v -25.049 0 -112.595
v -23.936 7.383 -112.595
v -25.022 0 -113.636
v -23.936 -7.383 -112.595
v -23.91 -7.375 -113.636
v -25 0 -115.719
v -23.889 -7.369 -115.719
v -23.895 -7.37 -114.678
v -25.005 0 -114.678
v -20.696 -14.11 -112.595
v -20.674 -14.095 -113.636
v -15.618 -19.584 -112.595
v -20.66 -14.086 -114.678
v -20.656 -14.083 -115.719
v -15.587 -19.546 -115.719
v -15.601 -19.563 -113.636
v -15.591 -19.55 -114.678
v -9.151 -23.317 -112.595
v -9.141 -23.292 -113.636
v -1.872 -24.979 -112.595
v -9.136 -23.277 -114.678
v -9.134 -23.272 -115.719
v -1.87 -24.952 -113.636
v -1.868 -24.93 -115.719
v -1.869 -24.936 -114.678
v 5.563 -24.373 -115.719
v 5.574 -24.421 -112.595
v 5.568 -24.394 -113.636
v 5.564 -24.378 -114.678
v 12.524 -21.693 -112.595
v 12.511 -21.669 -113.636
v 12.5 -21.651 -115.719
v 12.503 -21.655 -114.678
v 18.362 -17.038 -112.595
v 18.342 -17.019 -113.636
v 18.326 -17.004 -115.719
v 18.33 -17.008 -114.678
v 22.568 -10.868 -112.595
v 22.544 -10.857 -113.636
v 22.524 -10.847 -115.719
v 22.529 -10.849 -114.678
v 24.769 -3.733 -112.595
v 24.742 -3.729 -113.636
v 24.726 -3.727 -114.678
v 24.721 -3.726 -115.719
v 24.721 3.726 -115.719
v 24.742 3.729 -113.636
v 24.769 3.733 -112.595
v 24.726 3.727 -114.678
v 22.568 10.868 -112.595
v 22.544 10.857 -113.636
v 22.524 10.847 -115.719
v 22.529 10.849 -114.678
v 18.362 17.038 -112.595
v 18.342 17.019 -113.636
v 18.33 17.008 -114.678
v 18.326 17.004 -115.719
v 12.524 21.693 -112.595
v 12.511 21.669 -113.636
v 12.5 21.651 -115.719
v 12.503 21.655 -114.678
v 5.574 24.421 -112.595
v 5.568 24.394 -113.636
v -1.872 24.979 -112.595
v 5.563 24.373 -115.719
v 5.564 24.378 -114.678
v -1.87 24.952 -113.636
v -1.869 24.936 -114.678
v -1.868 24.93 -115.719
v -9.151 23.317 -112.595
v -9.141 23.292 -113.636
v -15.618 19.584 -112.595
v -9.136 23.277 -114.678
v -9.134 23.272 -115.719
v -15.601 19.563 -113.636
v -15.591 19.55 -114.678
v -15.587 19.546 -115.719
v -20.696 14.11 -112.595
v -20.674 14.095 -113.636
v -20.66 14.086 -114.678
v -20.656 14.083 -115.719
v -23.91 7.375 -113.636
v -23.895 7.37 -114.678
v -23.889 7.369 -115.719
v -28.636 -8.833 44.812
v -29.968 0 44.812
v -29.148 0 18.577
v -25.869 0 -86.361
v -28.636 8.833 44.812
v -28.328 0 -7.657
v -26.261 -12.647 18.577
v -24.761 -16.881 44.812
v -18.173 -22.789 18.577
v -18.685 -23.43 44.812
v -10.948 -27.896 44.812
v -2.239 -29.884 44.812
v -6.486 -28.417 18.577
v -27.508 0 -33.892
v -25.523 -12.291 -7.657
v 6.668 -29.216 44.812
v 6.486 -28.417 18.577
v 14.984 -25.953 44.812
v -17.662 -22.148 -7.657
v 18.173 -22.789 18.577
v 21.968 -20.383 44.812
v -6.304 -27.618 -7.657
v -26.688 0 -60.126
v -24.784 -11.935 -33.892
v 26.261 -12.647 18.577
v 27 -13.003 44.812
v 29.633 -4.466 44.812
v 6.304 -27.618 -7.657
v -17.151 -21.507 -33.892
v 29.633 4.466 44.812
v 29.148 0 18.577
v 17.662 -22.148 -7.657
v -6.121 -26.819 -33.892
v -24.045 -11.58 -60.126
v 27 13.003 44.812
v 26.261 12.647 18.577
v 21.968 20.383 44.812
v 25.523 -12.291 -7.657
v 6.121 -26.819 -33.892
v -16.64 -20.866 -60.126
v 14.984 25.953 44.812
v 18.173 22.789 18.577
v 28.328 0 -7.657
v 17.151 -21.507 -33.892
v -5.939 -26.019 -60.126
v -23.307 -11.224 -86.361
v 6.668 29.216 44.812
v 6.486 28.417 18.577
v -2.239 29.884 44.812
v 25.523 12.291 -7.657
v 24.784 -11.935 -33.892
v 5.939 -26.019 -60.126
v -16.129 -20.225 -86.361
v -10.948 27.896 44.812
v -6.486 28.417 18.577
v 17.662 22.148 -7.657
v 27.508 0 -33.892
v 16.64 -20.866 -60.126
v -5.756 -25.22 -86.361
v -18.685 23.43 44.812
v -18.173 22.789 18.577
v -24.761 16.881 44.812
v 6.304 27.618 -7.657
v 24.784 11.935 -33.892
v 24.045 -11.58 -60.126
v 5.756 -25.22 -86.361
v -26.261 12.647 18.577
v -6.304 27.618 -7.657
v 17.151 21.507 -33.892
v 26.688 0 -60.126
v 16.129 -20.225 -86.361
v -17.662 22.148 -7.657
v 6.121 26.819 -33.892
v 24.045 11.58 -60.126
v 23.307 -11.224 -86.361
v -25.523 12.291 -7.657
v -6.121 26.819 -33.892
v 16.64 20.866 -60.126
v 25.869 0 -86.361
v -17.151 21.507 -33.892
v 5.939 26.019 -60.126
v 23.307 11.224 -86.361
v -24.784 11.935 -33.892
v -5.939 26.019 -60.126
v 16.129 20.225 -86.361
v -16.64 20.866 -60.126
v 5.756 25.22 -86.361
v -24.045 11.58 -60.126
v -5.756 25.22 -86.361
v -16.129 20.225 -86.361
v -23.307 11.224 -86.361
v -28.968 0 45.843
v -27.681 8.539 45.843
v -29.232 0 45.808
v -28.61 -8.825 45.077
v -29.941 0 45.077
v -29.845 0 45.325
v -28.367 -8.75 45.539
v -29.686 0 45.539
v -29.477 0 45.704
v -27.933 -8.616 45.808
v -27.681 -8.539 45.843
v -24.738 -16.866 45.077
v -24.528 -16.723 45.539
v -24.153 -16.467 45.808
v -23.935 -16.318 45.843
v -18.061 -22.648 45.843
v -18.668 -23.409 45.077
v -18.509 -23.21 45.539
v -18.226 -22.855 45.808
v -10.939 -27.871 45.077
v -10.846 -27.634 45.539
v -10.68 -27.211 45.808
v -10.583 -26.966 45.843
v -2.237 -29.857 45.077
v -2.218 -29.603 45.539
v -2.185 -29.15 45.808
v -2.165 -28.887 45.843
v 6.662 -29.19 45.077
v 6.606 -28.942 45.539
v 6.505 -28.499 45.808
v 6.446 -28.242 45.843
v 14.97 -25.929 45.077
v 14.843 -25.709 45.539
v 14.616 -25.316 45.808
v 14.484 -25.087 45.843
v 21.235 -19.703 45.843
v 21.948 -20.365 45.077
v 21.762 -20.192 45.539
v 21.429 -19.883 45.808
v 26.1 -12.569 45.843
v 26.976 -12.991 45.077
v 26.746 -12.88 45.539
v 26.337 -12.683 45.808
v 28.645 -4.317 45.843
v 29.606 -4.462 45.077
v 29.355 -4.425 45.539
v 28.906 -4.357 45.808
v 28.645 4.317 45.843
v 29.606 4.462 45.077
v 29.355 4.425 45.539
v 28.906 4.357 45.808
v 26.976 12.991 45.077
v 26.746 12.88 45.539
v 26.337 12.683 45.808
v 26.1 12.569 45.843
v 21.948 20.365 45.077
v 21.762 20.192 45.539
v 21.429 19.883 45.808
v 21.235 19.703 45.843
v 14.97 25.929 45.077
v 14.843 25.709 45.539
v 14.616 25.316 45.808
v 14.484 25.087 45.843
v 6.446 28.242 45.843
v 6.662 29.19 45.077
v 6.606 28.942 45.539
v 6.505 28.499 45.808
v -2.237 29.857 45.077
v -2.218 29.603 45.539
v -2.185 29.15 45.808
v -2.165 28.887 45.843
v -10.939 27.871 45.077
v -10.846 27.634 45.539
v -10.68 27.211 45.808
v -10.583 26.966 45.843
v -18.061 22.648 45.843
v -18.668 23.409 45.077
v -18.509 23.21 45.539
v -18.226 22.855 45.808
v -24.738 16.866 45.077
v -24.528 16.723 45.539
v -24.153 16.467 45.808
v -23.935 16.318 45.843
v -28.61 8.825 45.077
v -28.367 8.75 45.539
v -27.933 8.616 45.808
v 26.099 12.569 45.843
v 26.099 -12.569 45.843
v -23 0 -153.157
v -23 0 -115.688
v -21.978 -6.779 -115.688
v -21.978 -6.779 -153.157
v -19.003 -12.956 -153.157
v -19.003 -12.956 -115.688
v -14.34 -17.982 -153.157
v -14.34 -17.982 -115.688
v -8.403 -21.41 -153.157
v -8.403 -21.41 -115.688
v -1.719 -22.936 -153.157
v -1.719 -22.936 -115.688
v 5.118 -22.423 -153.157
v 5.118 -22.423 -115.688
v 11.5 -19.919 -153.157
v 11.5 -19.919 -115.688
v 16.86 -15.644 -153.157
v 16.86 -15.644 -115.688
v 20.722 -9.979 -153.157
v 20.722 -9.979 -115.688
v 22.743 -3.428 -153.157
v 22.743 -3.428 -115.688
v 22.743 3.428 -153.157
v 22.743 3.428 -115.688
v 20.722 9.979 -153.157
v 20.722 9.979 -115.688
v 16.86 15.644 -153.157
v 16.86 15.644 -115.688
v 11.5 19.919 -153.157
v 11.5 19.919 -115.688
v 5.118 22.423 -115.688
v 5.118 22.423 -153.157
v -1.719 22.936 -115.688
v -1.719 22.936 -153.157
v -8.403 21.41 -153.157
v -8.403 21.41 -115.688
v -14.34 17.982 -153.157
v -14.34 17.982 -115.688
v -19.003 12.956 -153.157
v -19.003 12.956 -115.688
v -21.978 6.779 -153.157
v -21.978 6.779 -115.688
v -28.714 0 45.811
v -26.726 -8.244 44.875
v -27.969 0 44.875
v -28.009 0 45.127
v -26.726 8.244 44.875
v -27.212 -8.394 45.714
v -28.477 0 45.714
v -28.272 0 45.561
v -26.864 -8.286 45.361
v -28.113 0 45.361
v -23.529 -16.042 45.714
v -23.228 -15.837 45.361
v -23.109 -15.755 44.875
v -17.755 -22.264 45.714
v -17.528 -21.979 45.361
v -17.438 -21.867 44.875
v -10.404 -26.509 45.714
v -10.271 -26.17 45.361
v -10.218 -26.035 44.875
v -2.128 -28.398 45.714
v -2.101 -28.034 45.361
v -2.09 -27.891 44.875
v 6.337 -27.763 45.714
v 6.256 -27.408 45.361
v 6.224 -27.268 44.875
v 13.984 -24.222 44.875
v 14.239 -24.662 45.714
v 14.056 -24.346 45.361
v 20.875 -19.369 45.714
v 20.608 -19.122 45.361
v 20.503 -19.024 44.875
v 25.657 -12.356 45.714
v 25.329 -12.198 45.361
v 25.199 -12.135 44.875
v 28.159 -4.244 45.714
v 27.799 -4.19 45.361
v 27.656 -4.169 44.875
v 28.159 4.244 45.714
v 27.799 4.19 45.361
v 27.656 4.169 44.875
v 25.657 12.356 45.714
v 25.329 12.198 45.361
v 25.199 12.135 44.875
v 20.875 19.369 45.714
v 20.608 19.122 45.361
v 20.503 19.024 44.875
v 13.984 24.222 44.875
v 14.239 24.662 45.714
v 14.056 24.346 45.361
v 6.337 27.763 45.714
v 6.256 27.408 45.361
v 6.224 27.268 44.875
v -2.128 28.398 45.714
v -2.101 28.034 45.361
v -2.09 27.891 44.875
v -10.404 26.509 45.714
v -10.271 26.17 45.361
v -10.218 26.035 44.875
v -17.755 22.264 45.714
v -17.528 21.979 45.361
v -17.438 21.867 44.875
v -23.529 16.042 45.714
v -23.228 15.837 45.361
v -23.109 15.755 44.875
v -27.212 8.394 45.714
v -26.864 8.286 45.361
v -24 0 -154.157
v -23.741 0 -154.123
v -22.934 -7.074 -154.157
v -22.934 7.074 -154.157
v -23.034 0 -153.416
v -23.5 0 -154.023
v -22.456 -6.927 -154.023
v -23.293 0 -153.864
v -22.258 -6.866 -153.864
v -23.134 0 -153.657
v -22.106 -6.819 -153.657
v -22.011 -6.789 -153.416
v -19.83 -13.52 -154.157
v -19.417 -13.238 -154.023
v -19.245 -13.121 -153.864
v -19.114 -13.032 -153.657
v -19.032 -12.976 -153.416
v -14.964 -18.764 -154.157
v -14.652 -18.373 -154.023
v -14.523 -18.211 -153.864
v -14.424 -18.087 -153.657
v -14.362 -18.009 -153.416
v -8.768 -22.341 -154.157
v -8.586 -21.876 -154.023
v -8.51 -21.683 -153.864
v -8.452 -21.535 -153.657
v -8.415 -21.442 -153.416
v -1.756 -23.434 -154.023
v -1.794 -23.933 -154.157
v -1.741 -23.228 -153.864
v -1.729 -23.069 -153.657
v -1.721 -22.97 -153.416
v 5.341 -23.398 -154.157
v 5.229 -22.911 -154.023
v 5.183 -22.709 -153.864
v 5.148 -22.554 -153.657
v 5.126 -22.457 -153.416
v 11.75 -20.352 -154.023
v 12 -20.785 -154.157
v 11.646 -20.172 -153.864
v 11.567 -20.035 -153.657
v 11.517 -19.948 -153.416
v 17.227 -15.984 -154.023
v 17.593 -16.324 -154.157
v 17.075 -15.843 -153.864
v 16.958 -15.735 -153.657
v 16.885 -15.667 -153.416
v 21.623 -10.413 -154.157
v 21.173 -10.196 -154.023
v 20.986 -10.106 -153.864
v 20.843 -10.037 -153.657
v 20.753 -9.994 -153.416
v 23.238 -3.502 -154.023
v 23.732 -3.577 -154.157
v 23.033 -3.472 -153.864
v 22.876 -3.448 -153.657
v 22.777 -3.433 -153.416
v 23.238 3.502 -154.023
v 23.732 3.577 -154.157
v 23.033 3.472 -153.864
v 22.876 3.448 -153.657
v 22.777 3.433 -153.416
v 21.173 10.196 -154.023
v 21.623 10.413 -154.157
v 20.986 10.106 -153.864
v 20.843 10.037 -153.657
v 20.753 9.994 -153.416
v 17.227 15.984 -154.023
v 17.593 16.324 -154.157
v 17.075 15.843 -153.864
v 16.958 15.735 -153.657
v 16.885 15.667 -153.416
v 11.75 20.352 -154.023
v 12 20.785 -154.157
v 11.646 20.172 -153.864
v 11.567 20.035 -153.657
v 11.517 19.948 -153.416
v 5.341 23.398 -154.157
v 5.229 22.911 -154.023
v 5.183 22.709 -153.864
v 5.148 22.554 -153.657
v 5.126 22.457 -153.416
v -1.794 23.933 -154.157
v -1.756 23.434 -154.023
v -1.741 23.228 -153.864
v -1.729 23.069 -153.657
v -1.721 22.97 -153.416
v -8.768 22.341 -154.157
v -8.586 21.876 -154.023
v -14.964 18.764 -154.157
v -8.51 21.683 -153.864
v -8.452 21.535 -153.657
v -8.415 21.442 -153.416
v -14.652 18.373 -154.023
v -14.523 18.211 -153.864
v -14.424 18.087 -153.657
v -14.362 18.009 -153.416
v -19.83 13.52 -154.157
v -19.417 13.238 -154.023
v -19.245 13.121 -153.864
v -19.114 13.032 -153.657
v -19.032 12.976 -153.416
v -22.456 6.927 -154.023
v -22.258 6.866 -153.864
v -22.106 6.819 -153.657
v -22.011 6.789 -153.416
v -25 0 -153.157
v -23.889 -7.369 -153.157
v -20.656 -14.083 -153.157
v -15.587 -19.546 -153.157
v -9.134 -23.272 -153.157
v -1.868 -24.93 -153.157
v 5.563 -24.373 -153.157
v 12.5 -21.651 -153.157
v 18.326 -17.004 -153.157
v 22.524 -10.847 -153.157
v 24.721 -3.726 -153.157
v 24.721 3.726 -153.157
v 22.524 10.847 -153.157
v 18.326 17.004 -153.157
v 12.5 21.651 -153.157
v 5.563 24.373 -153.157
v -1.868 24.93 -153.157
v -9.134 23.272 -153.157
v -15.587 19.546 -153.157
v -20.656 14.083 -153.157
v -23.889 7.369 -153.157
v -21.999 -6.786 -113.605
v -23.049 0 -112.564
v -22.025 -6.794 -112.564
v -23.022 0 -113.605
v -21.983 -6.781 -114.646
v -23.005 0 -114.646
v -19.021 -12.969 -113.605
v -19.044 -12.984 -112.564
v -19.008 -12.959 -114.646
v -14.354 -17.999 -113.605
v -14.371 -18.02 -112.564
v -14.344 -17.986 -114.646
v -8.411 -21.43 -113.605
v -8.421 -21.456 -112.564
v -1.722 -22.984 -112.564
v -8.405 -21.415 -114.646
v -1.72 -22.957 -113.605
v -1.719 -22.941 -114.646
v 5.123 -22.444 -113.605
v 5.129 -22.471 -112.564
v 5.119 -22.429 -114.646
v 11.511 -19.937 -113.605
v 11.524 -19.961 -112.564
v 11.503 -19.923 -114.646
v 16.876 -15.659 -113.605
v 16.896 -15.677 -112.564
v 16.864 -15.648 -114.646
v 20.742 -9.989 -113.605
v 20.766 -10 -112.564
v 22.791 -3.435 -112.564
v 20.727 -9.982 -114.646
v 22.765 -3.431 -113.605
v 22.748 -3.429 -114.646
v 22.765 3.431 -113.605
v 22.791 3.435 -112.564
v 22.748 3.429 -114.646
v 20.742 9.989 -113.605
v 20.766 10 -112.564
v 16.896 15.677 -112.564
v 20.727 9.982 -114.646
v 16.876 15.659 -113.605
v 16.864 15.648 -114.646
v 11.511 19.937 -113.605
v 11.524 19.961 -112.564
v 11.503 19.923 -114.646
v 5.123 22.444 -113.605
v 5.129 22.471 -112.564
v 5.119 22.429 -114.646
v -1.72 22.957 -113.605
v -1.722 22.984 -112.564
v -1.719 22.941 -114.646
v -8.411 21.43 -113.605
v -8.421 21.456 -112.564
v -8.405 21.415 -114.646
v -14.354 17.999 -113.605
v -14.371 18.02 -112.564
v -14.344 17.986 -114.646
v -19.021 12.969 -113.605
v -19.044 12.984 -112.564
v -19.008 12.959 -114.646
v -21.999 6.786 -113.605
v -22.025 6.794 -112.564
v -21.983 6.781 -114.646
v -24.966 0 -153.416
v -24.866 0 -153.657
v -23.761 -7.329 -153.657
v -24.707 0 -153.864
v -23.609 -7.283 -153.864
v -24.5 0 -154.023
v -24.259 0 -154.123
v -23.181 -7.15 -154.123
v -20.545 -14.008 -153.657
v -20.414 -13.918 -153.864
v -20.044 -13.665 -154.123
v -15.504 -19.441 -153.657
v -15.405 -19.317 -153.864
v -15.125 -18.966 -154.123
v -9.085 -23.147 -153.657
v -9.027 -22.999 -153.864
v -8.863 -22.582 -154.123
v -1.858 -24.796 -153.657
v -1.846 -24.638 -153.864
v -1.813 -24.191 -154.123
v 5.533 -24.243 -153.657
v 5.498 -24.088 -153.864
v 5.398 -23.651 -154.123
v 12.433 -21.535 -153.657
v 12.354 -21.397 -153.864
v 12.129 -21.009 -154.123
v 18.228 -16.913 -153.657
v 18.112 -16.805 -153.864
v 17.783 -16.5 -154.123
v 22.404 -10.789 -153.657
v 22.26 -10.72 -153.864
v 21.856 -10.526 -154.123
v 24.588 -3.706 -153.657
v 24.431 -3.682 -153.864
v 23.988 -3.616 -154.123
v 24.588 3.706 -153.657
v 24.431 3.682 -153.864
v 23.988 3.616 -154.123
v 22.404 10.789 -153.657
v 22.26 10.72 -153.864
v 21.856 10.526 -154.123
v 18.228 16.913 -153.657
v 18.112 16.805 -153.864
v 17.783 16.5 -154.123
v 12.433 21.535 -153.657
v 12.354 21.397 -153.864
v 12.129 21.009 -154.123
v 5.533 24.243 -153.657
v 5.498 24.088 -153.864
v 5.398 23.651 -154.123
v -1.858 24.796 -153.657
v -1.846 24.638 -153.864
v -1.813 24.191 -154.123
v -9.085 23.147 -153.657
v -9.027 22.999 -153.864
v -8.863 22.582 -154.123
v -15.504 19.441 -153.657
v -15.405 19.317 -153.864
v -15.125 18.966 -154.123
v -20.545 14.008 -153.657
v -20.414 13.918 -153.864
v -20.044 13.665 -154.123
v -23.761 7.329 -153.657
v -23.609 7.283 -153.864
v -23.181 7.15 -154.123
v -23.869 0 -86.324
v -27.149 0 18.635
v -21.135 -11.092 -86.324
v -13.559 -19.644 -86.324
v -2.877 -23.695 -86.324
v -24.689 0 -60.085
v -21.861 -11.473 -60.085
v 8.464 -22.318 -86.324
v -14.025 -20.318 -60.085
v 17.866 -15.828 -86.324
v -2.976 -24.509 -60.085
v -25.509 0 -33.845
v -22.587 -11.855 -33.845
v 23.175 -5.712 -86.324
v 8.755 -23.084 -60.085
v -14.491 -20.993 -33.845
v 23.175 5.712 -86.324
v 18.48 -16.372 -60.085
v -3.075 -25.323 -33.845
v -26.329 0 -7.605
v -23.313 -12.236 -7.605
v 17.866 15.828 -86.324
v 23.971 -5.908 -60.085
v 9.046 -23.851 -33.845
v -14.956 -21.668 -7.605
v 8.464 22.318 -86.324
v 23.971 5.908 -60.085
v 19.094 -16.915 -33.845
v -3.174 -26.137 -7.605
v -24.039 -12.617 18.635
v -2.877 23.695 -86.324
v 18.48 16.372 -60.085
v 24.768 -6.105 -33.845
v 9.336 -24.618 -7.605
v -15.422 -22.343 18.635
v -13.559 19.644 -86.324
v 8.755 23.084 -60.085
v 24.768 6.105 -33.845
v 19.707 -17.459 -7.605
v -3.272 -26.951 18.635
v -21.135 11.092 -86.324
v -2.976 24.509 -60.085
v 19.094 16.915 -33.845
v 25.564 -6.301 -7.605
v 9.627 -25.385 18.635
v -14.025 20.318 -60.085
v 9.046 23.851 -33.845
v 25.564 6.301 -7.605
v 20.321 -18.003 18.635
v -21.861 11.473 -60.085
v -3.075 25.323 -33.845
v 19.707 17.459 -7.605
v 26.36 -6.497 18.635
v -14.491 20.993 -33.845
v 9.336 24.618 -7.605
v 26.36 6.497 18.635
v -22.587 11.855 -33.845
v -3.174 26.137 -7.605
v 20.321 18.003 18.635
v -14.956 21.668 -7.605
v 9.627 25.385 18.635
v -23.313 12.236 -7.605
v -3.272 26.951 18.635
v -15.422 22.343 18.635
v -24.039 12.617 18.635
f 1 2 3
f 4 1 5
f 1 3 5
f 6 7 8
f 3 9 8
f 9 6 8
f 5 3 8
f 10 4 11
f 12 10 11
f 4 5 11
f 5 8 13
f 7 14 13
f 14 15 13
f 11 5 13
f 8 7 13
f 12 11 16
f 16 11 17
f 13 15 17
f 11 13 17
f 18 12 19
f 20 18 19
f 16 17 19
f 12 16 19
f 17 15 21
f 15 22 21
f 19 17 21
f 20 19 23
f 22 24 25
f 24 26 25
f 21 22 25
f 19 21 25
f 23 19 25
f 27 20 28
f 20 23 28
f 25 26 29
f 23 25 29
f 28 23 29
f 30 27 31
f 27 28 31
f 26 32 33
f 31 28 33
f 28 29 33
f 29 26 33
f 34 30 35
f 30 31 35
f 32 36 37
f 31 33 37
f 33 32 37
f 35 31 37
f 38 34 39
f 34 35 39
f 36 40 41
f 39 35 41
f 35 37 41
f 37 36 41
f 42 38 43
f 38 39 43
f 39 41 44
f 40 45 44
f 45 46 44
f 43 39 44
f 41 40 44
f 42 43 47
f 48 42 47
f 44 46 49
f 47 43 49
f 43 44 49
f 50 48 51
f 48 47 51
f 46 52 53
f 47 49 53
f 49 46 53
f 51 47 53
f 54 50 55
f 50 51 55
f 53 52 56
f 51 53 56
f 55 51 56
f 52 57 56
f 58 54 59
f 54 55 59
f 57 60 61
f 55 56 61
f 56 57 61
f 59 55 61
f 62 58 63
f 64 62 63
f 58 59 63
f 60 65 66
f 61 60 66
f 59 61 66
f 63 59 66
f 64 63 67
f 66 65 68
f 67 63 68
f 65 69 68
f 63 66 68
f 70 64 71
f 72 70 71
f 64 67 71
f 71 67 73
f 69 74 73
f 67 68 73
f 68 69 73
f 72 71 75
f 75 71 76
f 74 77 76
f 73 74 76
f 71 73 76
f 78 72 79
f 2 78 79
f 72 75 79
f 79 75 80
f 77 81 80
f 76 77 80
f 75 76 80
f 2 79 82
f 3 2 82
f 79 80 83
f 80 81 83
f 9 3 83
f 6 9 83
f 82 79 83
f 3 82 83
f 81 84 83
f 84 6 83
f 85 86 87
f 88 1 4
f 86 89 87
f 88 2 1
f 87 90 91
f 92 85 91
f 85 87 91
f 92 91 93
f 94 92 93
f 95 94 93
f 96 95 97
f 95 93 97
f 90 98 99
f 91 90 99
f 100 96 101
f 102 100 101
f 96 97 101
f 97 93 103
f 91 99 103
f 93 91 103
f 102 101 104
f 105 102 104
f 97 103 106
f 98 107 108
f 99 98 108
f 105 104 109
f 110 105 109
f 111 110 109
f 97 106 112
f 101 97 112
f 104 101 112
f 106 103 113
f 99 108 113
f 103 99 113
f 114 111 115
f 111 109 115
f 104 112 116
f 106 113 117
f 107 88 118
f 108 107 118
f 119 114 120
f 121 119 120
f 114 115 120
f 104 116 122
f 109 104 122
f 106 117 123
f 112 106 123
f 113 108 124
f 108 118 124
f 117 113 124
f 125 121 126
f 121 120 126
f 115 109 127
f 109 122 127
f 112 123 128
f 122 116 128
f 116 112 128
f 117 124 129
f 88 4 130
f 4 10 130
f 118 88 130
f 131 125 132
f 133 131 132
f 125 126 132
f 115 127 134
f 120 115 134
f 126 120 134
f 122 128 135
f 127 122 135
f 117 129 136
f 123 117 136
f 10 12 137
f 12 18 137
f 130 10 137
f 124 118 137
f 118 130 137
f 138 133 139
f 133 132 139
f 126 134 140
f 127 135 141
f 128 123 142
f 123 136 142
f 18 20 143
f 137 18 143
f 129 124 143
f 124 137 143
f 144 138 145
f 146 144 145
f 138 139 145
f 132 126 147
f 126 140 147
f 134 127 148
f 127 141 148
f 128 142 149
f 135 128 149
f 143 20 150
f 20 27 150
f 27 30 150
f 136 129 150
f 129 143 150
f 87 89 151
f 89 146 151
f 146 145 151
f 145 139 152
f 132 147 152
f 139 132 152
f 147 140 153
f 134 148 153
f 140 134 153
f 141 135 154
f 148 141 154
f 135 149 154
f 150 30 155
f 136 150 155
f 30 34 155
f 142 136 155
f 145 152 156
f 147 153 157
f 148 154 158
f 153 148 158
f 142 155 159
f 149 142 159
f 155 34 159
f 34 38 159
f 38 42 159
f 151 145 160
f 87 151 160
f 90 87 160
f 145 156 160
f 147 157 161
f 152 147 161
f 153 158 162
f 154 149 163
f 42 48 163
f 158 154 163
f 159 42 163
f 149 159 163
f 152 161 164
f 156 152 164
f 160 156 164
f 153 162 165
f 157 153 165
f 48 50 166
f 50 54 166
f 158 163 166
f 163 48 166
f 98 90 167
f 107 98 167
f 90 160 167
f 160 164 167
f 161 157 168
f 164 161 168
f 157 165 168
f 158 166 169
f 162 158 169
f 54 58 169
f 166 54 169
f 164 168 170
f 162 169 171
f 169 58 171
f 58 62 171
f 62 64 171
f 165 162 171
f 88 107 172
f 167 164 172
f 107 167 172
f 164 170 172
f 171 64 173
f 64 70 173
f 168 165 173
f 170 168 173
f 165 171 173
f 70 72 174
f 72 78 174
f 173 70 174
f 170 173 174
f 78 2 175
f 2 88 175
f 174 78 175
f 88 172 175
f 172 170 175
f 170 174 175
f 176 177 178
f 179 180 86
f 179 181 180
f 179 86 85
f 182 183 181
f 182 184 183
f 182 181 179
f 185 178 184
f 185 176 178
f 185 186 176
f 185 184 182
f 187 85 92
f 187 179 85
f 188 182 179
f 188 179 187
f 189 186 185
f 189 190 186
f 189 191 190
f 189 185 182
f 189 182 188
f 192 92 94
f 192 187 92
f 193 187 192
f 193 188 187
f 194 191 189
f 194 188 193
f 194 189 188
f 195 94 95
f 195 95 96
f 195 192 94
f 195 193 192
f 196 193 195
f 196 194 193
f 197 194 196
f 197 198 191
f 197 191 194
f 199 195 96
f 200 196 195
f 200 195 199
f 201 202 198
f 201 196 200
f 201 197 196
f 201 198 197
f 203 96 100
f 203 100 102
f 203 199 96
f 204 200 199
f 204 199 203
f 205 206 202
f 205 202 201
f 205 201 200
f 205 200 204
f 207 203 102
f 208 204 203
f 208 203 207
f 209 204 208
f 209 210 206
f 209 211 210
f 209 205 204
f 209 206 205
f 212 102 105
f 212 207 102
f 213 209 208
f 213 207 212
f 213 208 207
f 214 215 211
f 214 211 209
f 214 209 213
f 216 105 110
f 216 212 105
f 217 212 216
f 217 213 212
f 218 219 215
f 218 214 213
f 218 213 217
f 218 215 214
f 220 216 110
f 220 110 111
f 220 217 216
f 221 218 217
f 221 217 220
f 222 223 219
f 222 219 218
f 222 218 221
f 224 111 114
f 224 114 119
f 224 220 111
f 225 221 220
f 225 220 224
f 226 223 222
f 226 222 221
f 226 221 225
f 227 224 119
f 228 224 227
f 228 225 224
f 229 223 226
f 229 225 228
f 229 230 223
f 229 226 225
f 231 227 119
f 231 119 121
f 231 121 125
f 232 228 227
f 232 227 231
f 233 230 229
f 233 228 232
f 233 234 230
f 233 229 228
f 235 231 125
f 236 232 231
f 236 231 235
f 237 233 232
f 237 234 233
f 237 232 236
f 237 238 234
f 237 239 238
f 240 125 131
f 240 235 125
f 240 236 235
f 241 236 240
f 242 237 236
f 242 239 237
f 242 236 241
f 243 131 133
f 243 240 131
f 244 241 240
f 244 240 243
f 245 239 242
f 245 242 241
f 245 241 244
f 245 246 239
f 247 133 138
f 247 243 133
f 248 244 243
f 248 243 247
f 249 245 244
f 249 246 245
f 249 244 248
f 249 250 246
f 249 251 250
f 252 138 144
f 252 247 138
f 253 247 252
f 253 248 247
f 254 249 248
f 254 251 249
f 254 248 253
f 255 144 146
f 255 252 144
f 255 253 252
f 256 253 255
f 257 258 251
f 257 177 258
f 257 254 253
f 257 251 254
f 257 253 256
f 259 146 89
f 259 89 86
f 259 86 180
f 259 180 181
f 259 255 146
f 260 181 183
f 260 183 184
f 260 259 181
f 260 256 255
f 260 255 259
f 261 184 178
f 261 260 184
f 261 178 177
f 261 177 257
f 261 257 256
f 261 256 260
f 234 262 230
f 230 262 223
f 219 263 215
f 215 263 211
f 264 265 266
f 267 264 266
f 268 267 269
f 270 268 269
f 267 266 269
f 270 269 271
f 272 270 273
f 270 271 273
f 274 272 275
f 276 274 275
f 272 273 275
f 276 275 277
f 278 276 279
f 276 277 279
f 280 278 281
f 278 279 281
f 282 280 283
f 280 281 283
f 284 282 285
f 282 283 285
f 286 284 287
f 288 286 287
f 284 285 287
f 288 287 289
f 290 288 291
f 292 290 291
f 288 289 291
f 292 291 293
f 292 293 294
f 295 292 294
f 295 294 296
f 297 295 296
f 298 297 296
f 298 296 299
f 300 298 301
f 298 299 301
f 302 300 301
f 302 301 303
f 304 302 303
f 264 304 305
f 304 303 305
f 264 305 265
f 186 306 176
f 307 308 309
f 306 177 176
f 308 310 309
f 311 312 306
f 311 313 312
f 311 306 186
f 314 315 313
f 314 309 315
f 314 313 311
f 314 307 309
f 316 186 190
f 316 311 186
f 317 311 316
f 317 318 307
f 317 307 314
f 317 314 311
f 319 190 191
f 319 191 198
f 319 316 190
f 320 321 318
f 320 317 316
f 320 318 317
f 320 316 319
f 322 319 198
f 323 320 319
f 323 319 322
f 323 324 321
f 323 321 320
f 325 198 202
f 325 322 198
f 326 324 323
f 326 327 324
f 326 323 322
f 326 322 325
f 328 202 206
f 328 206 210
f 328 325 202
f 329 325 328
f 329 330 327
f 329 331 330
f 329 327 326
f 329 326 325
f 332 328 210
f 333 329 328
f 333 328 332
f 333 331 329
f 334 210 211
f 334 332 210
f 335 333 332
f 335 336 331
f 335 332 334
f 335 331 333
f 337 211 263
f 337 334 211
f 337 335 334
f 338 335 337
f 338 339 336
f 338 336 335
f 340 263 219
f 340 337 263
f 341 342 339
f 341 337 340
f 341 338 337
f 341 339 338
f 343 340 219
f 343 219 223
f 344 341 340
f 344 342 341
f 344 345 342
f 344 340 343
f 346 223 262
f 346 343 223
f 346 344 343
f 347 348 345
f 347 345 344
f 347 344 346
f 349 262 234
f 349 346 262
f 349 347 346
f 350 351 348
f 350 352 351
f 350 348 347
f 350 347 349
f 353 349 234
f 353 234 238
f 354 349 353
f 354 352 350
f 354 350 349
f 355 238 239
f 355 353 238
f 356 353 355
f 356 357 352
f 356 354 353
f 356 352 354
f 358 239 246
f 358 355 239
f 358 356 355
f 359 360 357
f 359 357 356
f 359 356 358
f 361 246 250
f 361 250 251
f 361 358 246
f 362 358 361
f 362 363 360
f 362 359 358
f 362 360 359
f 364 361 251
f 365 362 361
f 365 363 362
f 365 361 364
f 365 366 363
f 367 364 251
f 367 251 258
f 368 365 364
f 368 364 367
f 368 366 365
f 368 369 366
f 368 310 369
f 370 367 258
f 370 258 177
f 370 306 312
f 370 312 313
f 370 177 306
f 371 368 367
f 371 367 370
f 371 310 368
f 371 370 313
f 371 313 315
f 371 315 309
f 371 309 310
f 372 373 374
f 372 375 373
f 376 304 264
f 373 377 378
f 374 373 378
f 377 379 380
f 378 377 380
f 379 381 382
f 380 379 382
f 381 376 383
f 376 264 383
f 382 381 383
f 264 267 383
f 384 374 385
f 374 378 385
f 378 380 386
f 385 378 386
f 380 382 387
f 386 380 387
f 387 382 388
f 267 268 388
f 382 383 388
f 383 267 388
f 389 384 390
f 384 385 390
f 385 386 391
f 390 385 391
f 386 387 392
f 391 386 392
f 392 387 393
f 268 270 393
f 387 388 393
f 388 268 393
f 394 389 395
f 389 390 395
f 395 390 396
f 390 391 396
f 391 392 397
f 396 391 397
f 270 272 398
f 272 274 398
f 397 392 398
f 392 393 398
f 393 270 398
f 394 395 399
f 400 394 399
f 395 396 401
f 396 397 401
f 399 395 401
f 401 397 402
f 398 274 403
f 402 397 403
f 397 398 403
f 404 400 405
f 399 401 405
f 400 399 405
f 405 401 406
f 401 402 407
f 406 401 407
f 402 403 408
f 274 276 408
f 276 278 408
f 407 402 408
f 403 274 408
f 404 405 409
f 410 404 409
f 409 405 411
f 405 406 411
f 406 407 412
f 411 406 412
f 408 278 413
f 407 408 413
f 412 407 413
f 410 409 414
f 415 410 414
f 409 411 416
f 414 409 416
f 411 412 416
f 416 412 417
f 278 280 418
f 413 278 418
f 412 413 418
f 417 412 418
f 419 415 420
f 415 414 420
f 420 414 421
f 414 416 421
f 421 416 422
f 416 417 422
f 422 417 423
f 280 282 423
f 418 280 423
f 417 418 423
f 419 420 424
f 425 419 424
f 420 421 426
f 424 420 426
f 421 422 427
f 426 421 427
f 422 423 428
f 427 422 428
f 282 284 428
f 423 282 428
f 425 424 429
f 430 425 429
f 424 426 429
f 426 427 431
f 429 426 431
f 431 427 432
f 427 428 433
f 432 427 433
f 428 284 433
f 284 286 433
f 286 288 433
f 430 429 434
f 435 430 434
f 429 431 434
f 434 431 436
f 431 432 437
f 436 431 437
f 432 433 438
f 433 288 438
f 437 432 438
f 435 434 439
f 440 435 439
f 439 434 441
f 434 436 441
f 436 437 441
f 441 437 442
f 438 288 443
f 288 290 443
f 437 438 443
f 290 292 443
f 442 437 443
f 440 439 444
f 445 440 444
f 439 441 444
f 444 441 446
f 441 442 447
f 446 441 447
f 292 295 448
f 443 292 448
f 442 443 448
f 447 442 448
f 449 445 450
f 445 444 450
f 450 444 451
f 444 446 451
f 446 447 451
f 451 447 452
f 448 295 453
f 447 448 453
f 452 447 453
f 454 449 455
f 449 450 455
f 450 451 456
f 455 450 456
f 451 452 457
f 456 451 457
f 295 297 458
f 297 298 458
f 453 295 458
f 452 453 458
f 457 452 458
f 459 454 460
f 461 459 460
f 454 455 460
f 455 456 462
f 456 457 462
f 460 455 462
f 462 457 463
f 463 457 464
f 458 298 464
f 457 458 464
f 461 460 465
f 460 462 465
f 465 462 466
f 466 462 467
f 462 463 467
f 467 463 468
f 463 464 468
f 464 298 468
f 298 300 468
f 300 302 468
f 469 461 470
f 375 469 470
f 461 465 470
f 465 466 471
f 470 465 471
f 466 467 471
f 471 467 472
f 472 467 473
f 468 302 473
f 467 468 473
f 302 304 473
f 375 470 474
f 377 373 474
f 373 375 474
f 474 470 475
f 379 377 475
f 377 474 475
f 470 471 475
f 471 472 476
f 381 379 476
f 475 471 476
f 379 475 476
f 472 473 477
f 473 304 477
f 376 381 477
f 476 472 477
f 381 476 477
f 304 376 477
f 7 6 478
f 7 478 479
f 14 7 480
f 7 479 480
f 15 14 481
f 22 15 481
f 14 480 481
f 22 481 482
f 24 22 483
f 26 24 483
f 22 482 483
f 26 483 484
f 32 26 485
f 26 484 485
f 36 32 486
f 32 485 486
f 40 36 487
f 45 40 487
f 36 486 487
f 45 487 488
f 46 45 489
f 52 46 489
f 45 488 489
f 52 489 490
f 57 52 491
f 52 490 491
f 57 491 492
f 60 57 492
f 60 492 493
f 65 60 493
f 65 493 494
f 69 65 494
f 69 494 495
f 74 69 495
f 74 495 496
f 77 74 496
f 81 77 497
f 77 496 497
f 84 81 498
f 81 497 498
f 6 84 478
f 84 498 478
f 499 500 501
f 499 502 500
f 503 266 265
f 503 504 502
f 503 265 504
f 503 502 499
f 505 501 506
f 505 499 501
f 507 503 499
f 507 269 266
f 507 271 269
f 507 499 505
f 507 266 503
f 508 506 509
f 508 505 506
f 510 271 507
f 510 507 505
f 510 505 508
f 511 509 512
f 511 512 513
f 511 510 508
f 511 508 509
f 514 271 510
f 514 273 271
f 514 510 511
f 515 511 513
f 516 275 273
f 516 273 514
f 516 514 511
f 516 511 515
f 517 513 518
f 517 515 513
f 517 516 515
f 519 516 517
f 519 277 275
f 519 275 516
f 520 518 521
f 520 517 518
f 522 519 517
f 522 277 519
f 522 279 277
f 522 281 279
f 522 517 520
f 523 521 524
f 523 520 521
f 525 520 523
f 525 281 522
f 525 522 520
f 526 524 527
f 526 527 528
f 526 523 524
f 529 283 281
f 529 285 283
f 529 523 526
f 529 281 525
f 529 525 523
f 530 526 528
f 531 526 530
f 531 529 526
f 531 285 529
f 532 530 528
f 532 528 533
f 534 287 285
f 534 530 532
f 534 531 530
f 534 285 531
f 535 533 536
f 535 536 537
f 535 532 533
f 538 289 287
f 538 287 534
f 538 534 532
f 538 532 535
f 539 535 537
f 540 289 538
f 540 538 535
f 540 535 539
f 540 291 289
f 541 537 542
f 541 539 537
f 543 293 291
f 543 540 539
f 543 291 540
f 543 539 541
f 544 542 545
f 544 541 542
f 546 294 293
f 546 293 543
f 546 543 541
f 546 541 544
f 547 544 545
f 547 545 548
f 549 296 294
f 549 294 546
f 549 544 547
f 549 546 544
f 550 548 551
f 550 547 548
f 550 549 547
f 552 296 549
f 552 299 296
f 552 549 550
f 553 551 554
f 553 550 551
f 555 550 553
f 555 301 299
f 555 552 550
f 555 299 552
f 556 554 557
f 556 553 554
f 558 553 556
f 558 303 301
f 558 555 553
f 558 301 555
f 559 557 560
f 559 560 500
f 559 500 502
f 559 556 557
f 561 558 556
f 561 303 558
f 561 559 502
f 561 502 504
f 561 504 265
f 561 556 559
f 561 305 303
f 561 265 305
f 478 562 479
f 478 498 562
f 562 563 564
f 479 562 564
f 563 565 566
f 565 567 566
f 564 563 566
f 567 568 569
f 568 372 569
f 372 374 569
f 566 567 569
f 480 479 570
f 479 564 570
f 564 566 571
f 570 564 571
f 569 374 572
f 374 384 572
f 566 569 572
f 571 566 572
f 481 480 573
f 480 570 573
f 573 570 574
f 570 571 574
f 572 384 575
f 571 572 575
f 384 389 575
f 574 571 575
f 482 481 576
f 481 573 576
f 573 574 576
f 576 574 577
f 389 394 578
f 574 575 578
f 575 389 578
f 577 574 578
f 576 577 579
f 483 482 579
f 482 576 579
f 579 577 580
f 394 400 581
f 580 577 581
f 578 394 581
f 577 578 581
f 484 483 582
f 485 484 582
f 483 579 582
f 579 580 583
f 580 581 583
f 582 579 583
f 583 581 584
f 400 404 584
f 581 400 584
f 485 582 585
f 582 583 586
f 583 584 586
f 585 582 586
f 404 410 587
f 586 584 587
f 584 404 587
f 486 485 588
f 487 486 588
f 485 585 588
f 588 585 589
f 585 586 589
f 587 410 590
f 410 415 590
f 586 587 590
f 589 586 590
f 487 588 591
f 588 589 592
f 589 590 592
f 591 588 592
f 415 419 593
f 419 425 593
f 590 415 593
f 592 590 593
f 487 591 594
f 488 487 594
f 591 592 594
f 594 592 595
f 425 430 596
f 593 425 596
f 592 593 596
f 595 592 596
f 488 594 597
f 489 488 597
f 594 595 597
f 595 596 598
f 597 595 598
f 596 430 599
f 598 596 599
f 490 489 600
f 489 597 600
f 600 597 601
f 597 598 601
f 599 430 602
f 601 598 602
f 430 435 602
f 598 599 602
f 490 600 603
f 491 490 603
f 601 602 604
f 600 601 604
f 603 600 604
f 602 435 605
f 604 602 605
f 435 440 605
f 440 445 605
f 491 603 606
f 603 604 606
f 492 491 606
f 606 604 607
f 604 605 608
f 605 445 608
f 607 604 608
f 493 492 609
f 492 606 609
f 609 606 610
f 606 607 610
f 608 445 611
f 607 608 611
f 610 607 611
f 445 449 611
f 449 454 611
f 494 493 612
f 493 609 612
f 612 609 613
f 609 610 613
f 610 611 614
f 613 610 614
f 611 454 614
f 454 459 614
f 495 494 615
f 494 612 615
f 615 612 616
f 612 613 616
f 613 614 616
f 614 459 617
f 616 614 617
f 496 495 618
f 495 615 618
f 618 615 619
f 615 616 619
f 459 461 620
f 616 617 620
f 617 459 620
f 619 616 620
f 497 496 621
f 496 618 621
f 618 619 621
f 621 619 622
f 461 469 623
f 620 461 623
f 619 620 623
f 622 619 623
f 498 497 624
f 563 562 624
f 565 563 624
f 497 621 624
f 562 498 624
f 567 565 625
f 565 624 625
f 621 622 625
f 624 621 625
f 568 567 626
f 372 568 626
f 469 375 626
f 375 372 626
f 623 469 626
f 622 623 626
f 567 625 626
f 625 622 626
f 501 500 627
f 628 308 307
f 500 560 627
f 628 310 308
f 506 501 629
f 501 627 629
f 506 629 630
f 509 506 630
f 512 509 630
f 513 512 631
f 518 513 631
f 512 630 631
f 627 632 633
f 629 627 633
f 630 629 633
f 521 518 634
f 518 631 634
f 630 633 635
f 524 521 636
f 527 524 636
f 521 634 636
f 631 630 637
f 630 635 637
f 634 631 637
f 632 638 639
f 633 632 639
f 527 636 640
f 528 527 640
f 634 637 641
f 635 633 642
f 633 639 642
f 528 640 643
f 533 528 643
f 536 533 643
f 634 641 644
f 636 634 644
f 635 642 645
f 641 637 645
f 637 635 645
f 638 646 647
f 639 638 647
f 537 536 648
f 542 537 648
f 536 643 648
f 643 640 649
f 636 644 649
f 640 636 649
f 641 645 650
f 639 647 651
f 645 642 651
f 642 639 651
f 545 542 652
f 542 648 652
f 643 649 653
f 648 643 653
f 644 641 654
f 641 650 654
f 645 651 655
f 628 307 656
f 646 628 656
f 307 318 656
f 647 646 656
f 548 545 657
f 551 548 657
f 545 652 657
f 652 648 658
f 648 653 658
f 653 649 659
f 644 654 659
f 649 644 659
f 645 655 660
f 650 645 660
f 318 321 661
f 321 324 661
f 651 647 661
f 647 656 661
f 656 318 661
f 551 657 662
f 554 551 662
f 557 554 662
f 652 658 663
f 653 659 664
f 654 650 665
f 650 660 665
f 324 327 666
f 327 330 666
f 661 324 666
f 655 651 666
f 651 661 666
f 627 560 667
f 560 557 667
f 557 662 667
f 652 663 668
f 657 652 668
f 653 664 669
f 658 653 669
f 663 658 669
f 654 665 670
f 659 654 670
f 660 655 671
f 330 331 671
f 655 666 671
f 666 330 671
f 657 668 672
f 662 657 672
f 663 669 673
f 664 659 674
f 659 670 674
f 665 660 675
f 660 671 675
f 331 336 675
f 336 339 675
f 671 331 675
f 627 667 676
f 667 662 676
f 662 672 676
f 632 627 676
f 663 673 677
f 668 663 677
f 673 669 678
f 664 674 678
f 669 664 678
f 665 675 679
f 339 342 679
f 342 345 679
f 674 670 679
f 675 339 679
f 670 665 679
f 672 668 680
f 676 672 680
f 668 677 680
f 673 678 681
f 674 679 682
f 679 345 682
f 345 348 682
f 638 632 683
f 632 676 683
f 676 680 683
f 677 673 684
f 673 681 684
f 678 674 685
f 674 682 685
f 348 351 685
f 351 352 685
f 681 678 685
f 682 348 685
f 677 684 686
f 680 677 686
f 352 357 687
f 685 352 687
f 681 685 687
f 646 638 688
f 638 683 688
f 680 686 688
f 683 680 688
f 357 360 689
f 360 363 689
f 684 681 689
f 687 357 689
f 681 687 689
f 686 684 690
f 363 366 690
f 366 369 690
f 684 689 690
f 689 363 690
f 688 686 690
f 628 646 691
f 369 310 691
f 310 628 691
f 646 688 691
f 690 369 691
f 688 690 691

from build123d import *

# Parameters (mm, degrees)
F3_R = 0.99999


# Not quite as in the source:
# - a fillet or chamfer that OpenCascade refuses, or shapes differently, is made with other operations: its cross-section is extruded or revolved along the edge and cut away or added
# - a fillet or chamfer is up to 0.001 mm smaller than in the source, because OpenCascade refuses the exact size


with BuildPart() as f1:
    # F0 (on Front) → F1 (revolve)
    with BuildSketch(Plane.XZ):
        Polygon((-23, -114.1254802332), (-27.9990236758, 45.8432773924), (-30, 45.8432773924), (-25, -114.1567226076), (-25, -154.1567226076), (-23, -154.1567226076), align=None)
    revolve(axis=Axis((0, 0, -54.1567226076), (0, 0, 1)))

    # F2: fillet of radius 100 on 2 edges, made by hand

    # F2_s1 → F2_t2 (revolve)
    with BuildSketch(Plane.XZ):
        with BuildLine():
            ThreePointArc((-25.0487923913, -112.5953660862), (-25.0121988419, -114.1569131679), (-25, -115.718841324))
            Line((-25, -115.718841324), (-25, -114.1567226076))
            Line((-25, -114.1567226076), (-25.0487923913, -112.5953660862))
        make_face()
    revolve(axis=Axis((0, 0, -114.1567226076), (0, 0, 1)))

    # F2_s3 → F2_t4 (revolve, cut)
    with BuildSketch(Plane.XZ):
        with BuildLine():
            ThreePointArc((-23.0487923913, -112.5641237119), (-23.0121988419, -114.1256707936), (-23, -115.6875989497))
            Line((-23, -115.6875989497), (-23, -114.1254802332))
            Line((-23, -114.1254802332), (-23.0487923913, -112.5641237119))
        make_face()
    revolve(axis=Axis((0, 0, -114.1254802332), (0, 0, 1)), mode=Mode.SUBTRACT)

    # F3 (radius 1 in the source; OpenCascade refuses exactly that, so slightly less here)
    f3_edges = [f1.edges().sort_by_distance(p)[0] for p in [
        (27.999024, 0, 45.843277),
        (30, 0, 45.843277),
        (25, 0, -154.156723),
        (23, 0, -154.156723),
    ]]
    fillet(f3_edges, radius=F3_R)


solid = f1.part
